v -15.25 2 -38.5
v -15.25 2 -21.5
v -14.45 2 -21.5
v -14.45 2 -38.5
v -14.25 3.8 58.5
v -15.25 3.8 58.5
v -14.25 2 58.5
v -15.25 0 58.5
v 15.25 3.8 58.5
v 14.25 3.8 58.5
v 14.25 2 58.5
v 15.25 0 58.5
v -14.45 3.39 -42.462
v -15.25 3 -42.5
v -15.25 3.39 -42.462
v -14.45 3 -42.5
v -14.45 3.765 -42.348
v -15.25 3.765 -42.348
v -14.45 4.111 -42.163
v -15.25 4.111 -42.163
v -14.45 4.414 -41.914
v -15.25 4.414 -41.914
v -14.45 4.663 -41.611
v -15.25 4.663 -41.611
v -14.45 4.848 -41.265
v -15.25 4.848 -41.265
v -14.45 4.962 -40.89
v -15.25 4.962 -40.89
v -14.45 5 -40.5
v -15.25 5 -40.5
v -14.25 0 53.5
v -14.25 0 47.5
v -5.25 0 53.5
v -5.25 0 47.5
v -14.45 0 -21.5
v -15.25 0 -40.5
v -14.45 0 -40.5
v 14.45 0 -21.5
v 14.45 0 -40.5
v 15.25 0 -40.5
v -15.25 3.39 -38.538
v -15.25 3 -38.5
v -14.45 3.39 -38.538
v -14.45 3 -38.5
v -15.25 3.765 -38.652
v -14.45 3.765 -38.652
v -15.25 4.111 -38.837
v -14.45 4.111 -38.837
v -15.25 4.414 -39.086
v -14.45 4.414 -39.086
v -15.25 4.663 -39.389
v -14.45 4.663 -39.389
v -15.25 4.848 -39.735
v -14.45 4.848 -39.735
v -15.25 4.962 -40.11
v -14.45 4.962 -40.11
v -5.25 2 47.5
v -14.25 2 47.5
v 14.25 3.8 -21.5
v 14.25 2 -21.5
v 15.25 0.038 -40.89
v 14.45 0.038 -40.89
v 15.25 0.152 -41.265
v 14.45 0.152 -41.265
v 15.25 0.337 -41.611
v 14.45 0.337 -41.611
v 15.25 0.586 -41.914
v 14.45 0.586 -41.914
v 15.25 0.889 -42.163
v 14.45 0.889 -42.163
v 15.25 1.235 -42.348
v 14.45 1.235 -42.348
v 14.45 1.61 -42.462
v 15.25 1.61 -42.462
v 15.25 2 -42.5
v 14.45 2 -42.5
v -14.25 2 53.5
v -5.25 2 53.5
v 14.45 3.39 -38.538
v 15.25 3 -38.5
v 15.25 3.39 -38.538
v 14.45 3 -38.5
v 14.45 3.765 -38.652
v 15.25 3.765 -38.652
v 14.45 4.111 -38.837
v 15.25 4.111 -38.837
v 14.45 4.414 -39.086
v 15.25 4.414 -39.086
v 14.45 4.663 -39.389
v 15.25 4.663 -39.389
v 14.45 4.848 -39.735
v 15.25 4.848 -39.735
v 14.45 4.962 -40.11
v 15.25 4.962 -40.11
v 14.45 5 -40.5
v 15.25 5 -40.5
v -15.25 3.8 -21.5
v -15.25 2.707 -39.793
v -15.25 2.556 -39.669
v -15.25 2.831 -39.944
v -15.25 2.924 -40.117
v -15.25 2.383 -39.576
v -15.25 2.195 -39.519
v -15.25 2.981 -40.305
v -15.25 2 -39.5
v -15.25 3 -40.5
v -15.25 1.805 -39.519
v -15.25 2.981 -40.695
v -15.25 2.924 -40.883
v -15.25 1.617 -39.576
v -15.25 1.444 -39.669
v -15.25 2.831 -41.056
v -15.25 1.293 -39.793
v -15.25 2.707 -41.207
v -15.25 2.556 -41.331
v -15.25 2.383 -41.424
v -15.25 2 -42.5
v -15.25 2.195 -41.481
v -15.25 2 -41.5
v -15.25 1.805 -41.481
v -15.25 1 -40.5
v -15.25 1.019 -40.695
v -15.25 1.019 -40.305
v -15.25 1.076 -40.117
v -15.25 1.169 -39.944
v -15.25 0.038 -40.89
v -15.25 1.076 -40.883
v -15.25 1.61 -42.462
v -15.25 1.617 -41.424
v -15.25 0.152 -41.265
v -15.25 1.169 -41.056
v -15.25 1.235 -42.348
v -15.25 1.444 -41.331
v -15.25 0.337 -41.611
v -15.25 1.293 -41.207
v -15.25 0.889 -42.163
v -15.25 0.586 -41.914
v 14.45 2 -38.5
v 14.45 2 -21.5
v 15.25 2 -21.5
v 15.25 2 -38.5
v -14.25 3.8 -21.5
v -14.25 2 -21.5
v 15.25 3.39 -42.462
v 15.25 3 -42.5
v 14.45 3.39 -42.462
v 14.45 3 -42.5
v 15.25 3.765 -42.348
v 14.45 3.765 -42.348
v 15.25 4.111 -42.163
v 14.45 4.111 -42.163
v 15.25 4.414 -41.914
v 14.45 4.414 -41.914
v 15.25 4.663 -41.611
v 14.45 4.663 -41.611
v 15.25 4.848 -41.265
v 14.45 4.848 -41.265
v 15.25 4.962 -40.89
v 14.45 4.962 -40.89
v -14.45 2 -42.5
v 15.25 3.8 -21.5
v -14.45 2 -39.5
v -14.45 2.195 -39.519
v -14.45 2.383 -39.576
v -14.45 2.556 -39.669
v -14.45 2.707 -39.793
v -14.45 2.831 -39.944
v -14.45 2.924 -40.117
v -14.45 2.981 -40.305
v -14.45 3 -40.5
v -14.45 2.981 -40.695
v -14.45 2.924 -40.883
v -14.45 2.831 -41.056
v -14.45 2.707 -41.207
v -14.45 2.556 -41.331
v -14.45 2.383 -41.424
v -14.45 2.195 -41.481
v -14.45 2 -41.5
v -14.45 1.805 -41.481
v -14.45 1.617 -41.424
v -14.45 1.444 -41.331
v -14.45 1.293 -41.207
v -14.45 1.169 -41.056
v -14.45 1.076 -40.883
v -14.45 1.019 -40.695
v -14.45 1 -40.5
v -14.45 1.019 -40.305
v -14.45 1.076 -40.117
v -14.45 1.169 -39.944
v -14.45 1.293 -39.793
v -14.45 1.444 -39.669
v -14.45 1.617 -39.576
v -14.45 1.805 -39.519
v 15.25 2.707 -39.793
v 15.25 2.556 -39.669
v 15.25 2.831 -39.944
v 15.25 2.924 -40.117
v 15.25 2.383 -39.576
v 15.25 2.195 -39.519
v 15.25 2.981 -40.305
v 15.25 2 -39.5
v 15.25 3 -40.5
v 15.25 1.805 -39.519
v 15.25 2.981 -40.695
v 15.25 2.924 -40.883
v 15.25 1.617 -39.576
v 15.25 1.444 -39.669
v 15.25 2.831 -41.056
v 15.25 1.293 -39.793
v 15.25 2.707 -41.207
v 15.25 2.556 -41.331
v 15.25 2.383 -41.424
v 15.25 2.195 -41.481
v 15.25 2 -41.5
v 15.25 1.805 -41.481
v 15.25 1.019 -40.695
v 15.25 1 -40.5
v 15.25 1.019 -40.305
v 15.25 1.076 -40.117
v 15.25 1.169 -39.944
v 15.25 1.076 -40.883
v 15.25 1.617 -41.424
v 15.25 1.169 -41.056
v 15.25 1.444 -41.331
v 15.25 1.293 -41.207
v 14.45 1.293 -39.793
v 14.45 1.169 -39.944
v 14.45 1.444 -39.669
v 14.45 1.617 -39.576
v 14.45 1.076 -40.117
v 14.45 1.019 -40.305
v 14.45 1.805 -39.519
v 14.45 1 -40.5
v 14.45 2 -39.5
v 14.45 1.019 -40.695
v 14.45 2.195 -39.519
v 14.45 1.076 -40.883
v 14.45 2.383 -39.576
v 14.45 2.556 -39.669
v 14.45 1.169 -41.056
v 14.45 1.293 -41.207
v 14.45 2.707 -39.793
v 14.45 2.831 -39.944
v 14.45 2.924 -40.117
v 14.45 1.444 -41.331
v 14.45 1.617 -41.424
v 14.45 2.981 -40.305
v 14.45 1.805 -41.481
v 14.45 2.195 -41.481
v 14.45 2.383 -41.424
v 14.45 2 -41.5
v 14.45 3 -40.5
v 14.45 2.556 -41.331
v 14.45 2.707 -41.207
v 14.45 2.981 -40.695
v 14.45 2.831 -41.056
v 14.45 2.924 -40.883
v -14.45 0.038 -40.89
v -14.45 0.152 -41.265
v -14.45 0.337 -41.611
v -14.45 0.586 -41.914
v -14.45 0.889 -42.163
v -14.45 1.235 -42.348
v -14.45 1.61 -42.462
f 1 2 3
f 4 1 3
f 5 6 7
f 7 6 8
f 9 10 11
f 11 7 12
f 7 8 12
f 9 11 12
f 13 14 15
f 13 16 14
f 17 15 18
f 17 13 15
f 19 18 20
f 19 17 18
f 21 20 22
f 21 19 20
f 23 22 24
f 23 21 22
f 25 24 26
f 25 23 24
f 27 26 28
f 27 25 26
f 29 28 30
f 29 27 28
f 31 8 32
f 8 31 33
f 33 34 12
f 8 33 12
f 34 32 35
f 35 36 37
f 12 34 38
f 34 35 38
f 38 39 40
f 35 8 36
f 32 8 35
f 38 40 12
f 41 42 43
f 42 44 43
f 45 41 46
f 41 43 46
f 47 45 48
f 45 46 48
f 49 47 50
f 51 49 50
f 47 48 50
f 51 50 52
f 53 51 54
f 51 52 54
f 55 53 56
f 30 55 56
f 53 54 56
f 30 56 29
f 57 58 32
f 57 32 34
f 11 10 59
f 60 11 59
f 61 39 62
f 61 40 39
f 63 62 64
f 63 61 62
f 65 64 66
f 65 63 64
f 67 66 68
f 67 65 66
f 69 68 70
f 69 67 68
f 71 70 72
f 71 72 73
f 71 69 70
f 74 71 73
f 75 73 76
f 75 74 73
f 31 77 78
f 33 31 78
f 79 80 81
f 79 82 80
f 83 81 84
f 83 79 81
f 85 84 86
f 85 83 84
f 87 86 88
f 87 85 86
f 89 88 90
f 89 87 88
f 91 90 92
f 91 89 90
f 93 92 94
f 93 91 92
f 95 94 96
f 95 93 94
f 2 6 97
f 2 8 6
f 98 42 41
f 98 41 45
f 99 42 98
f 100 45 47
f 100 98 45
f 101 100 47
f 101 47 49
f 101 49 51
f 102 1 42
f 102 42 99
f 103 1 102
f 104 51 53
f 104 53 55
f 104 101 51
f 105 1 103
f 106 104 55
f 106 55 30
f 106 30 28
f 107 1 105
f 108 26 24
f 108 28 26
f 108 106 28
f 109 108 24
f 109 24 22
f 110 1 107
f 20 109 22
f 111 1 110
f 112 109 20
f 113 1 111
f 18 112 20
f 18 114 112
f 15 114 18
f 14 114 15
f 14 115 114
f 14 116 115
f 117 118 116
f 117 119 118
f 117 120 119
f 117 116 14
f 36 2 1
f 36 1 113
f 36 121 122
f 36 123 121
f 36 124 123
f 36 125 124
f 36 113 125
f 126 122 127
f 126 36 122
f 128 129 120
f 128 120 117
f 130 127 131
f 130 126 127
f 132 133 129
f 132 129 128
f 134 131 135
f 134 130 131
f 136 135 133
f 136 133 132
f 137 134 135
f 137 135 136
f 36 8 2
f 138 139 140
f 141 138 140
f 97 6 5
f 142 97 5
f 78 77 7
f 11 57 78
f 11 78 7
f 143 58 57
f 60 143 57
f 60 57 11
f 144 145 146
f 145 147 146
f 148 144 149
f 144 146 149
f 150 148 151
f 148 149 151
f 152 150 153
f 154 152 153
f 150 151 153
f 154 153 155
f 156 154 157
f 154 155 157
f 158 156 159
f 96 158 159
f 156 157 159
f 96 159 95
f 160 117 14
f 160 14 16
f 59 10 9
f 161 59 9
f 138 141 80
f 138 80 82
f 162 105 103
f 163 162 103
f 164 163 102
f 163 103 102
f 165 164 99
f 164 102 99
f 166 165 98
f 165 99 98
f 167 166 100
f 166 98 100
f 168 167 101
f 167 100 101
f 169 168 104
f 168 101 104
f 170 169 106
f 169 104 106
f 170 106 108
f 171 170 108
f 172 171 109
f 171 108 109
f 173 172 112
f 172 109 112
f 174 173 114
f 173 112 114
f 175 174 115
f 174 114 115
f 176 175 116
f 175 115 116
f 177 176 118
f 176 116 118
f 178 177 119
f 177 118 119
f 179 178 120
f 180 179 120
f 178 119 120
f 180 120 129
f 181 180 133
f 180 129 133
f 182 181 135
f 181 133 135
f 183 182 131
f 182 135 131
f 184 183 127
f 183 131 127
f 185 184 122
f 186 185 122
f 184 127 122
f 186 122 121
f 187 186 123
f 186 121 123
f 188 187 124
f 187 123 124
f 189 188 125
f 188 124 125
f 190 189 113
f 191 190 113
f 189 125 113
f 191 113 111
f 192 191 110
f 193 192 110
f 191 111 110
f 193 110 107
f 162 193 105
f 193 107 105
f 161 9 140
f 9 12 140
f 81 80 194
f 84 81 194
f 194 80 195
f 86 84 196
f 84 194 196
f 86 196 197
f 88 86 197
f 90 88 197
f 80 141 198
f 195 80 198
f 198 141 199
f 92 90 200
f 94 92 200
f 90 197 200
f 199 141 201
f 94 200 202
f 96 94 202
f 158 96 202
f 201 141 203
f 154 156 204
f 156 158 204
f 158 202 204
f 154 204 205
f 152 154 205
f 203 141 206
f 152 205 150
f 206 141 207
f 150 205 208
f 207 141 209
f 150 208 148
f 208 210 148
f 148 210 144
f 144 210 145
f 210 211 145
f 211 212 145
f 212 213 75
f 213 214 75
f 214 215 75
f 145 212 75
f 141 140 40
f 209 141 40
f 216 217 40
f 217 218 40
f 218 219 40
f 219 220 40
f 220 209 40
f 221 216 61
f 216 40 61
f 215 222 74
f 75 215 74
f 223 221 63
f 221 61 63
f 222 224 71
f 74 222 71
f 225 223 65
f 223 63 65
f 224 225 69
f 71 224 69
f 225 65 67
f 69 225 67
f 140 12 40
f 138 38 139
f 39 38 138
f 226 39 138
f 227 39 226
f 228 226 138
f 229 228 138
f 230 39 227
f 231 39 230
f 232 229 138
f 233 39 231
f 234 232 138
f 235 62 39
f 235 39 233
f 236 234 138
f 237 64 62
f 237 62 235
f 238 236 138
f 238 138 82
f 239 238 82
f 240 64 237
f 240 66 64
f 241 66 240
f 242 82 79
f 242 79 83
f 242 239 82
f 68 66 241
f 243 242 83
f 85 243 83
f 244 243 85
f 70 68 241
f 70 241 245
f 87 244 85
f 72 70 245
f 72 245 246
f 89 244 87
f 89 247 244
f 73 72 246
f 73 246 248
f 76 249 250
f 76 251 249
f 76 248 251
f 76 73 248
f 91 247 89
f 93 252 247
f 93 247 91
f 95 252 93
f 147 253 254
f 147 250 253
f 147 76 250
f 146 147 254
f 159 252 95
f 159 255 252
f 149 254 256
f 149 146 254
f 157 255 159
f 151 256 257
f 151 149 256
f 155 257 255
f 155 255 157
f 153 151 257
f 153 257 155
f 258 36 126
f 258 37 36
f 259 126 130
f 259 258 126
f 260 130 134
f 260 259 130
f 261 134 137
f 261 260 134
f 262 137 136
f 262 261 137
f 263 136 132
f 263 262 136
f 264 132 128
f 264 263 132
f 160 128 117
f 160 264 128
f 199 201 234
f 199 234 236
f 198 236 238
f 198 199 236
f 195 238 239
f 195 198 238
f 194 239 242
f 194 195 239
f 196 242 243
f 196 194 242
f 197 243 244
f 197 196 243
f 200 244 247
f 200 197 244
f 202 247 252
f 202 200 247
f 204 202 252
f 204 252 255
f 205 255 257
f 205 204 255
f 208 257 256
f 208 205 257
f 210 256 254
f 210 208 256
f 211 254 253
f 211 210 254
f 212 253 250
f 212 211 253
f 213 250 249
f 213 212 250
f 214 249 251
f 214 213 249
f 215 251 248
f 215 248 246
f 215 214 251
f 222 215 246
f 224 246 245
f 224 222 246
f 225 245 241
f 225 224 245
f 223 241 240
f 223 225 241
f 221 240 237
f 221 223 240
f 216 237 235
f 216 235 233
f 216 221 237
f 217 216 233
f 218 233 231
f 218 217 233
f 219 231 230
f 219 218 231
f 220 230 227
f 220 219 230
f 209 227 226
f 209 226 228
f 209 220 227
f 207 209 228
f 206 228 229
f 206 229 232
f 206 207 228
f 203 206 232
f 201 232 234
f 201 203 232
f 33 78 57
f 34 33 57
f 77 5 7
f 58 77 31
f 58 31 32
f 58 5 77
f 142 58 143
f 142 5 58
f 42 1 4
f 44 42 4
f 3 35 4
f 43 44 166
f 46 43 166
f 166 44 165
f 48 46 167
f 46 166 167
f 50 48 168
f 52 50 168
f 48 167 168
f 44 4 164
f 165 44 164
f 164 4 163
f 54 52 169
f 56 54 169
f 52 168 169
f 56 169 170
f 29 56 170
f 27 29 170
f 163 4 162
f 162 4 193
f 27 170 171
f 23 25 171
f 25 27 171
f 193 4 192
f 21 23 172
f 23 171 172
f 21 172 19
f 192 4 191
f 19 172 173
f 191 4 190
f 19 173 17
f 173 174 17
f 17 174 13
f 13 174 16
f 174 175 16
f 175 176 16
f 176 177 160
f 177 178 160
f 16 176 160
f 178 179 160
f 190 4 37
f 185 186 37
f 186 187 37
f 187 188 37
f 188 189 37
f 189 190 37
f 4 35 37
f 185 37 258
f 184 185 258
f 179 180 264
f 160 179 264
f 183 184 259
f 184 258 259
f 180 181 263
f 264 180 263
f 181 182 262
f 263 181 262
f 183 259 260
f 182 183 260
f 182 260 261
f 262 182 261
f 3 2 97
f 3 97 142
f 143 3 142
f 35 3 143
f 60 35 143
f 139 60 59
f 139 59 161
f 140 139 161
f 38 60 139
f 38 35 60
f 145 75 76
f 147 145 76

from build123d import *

# Parameters (mm, degrees)
SKETCH1_W           = 30.5
SKETCH1_H           = 85
BOSS_EXTRUDE1_DEPTH = 2
CUT_EXTRUDE1_DEPTH  = 2
SKETCH5_W           = 0.8
SKETCH5_H           = 4
BOSS_EXTRUDE2_DEPTH = 3
SKETCH6_R           = 1
CUT_EXTRUDE2_DEPTH  = 0.8
FILLET1_R           = 2
FILLET2_R           = 2
SKETCH7_W           = 30.5
SKETCH7_H           = 2
BOSS_EXTRUDE3_DEPTH = 16
SKETCH8_W           = 30.5
SKETCH8_H           = 80
BOSS_EXTRUDE4_DEPTH = 1.8
SKETCH9_W           = 28.5
SKETCH9_H           = 80
CUT_EXTRUDE3_DEPTH  = 1.8
SKETCH10_W          = 28.9
SKETCH10_H          = 2
CUT_EXTRUDE4_DEPTH  = 1
SKETCH11_W          = 9
SKETCH11_H          = 6
CUT_EXTRUDE5_DEPTH  = 2


with BuildPart() as part:
    # Sketch1 → Boss-Extrude1 (new body)
    with BuildSketch(Plane(origin=(0, 0, 0), x_dir=(1, 0, 0), z_dir=(0, 1, 0))):
        Rectangle(SKETCH1_W, SKETCH1_H)
    extrude(amount=BOSS_EXTRUDE1_DEPTH)

    # Sketch2 → Cut-Extrude1 (cut)
    with BuildSketch(Plane(origin=(0, 2, 0), x_dir=(1, 0, 0), z_dir=(0, 1, 0))):
        Polygon((14.45, 42.5), (-14.45, 42.5), (-14.45, 24.5), (-14.45, 22.5), (14.45, 22.5), (14.45, 24.5), align=None)
    extrude(amount=-CUT_EXTRUDE1_DEPTH, mode=Mode.SUBTRACT)

    # Sketch5 → Boss-Extrude2 (add)
    with BuildSketch(Plane(origin=(0, 2, 0), x_dir=(1, 0, 0), z_dir=(0, 1, 0))):
        with Locations((-14.85, 40.5)):
            Rectangle(SKETCH5_W, SKETCH5_H)
    boss_extrude2 = extrude(amount=BOSS_EXTRUDE2_DEPTH)

    # Sketch6 → Cut-Extrude2 (cut)
    with BuildSketch(Plane.ZY.offset(15.25)):
        with Locations((-40.5, 2)):
            Circle(SKETCH6_R)
    cut_extrude2 = extrude(amount=-CUT_EXTRUDE2_DEPTH, mode=Mode.SUBTRACT)

    # Mirror1: Boss-Extrude2, Cut-Extrude2 across plane
    add(boss_extrude2.mirror(Plane(origin=(0, 0, 0), x_dir=(0, 0, 1), z_dir=(1, 0, 0))))
    add(cut_extrude2.mirror(Plane(origin=(0, 0, 0), x_dir=(0, 0, 1), z_dir=(1, 0, 0))), mode=Mode.SUBTRACT)

    # Fillet1
    fillet1_edges = [part.edges().sort_by_distance(p)[0] for p in [
        (-14.85, 0, -42.5),
        (-14.85, 5, -42.5),
        (-14.85, 5, -38.5),
    ]]
    fillet(fillet1_edges, radius=FILLET1_R - 0.0001)  # a hair under: the kernel refuses the full size

    # Fillet2
    fillet2_edges = [part.edges().sort_by_distance(p)[0] for p in [
        (14.85, 0, -42.5),
        (14.85, 5, -38.5),
        (14.85, 5, -42.5),
    ]]
    fillet(fillet2_edges, radius=FILLET2_R - 0.0001)  # a hair under: the kernel refuses the full size

    # Sketch7 → Boss-Extrude3 (add)
    with BuildSketch(Plane.XY.offset(42.5)):
        with Locations((0, 1)):
            Rectangle(SKETCH7_W, SKETCH7_H)
    extrude(amount=BOSS_EXTRUDE3_DEPTH)

    # Sketch8 → Boss-Extrude4 (add)
    with BuildSketch(Plane(origin=(0, 2, 0), x_dir=(1, 0, 0), z_dir=(0, 1, 0))):
        with Locations((0, -18.5)):
            Rectangle(SKETCH8_W, SKETCH8_H)
    extrude(amount=BOSS_EXTRUDE4_DEPTH)

    # Sketch9 → Cut-Extrude3 (cut)
    with BuildSketch(Plane(origin=(0, 3.8, 0), x_dir=(1, 0, 0), z_dir=(0, 1, 0))):
        with Locations((0, -18.5)):
            Rectangle(SKETCH9_W, SKETCH9_H)
    extrude(amount=-CUT_EXTRUDE3_DEPTH, mode=Mode.SUBTRACT)

    # Sketch10 → Cut-Extrude4 (cut)
    with BuildSketch(Plane(origin=(0, 0, -22.5), x_dir=(-1, 0, 0), z_dir=(0, 0, -1))):
        with Locations((0, 1)):
            Rectangle(SKETCH10_W, SKETCH10_H)
    extrude(amount=-CUT_EXTRUDE4_DEPTH, mode=Mode.SUBTRACT)

    # Sketch11 → Cut-Extrude5 (cut)
    with BuildSketch(Plane(origin=(0, 2, 0), x_dir=(1, 0, 0), z_dir=(0, 1, 0))):
        with Locations((-9.75, -50.5)):
            Rectangle(SKETCH11_W, SKETCH11_H)
    extrude(amount=-CUT_EXTRUDE5_DEPTH, mode=Mode.SUBTRACT)


solid = part.part
